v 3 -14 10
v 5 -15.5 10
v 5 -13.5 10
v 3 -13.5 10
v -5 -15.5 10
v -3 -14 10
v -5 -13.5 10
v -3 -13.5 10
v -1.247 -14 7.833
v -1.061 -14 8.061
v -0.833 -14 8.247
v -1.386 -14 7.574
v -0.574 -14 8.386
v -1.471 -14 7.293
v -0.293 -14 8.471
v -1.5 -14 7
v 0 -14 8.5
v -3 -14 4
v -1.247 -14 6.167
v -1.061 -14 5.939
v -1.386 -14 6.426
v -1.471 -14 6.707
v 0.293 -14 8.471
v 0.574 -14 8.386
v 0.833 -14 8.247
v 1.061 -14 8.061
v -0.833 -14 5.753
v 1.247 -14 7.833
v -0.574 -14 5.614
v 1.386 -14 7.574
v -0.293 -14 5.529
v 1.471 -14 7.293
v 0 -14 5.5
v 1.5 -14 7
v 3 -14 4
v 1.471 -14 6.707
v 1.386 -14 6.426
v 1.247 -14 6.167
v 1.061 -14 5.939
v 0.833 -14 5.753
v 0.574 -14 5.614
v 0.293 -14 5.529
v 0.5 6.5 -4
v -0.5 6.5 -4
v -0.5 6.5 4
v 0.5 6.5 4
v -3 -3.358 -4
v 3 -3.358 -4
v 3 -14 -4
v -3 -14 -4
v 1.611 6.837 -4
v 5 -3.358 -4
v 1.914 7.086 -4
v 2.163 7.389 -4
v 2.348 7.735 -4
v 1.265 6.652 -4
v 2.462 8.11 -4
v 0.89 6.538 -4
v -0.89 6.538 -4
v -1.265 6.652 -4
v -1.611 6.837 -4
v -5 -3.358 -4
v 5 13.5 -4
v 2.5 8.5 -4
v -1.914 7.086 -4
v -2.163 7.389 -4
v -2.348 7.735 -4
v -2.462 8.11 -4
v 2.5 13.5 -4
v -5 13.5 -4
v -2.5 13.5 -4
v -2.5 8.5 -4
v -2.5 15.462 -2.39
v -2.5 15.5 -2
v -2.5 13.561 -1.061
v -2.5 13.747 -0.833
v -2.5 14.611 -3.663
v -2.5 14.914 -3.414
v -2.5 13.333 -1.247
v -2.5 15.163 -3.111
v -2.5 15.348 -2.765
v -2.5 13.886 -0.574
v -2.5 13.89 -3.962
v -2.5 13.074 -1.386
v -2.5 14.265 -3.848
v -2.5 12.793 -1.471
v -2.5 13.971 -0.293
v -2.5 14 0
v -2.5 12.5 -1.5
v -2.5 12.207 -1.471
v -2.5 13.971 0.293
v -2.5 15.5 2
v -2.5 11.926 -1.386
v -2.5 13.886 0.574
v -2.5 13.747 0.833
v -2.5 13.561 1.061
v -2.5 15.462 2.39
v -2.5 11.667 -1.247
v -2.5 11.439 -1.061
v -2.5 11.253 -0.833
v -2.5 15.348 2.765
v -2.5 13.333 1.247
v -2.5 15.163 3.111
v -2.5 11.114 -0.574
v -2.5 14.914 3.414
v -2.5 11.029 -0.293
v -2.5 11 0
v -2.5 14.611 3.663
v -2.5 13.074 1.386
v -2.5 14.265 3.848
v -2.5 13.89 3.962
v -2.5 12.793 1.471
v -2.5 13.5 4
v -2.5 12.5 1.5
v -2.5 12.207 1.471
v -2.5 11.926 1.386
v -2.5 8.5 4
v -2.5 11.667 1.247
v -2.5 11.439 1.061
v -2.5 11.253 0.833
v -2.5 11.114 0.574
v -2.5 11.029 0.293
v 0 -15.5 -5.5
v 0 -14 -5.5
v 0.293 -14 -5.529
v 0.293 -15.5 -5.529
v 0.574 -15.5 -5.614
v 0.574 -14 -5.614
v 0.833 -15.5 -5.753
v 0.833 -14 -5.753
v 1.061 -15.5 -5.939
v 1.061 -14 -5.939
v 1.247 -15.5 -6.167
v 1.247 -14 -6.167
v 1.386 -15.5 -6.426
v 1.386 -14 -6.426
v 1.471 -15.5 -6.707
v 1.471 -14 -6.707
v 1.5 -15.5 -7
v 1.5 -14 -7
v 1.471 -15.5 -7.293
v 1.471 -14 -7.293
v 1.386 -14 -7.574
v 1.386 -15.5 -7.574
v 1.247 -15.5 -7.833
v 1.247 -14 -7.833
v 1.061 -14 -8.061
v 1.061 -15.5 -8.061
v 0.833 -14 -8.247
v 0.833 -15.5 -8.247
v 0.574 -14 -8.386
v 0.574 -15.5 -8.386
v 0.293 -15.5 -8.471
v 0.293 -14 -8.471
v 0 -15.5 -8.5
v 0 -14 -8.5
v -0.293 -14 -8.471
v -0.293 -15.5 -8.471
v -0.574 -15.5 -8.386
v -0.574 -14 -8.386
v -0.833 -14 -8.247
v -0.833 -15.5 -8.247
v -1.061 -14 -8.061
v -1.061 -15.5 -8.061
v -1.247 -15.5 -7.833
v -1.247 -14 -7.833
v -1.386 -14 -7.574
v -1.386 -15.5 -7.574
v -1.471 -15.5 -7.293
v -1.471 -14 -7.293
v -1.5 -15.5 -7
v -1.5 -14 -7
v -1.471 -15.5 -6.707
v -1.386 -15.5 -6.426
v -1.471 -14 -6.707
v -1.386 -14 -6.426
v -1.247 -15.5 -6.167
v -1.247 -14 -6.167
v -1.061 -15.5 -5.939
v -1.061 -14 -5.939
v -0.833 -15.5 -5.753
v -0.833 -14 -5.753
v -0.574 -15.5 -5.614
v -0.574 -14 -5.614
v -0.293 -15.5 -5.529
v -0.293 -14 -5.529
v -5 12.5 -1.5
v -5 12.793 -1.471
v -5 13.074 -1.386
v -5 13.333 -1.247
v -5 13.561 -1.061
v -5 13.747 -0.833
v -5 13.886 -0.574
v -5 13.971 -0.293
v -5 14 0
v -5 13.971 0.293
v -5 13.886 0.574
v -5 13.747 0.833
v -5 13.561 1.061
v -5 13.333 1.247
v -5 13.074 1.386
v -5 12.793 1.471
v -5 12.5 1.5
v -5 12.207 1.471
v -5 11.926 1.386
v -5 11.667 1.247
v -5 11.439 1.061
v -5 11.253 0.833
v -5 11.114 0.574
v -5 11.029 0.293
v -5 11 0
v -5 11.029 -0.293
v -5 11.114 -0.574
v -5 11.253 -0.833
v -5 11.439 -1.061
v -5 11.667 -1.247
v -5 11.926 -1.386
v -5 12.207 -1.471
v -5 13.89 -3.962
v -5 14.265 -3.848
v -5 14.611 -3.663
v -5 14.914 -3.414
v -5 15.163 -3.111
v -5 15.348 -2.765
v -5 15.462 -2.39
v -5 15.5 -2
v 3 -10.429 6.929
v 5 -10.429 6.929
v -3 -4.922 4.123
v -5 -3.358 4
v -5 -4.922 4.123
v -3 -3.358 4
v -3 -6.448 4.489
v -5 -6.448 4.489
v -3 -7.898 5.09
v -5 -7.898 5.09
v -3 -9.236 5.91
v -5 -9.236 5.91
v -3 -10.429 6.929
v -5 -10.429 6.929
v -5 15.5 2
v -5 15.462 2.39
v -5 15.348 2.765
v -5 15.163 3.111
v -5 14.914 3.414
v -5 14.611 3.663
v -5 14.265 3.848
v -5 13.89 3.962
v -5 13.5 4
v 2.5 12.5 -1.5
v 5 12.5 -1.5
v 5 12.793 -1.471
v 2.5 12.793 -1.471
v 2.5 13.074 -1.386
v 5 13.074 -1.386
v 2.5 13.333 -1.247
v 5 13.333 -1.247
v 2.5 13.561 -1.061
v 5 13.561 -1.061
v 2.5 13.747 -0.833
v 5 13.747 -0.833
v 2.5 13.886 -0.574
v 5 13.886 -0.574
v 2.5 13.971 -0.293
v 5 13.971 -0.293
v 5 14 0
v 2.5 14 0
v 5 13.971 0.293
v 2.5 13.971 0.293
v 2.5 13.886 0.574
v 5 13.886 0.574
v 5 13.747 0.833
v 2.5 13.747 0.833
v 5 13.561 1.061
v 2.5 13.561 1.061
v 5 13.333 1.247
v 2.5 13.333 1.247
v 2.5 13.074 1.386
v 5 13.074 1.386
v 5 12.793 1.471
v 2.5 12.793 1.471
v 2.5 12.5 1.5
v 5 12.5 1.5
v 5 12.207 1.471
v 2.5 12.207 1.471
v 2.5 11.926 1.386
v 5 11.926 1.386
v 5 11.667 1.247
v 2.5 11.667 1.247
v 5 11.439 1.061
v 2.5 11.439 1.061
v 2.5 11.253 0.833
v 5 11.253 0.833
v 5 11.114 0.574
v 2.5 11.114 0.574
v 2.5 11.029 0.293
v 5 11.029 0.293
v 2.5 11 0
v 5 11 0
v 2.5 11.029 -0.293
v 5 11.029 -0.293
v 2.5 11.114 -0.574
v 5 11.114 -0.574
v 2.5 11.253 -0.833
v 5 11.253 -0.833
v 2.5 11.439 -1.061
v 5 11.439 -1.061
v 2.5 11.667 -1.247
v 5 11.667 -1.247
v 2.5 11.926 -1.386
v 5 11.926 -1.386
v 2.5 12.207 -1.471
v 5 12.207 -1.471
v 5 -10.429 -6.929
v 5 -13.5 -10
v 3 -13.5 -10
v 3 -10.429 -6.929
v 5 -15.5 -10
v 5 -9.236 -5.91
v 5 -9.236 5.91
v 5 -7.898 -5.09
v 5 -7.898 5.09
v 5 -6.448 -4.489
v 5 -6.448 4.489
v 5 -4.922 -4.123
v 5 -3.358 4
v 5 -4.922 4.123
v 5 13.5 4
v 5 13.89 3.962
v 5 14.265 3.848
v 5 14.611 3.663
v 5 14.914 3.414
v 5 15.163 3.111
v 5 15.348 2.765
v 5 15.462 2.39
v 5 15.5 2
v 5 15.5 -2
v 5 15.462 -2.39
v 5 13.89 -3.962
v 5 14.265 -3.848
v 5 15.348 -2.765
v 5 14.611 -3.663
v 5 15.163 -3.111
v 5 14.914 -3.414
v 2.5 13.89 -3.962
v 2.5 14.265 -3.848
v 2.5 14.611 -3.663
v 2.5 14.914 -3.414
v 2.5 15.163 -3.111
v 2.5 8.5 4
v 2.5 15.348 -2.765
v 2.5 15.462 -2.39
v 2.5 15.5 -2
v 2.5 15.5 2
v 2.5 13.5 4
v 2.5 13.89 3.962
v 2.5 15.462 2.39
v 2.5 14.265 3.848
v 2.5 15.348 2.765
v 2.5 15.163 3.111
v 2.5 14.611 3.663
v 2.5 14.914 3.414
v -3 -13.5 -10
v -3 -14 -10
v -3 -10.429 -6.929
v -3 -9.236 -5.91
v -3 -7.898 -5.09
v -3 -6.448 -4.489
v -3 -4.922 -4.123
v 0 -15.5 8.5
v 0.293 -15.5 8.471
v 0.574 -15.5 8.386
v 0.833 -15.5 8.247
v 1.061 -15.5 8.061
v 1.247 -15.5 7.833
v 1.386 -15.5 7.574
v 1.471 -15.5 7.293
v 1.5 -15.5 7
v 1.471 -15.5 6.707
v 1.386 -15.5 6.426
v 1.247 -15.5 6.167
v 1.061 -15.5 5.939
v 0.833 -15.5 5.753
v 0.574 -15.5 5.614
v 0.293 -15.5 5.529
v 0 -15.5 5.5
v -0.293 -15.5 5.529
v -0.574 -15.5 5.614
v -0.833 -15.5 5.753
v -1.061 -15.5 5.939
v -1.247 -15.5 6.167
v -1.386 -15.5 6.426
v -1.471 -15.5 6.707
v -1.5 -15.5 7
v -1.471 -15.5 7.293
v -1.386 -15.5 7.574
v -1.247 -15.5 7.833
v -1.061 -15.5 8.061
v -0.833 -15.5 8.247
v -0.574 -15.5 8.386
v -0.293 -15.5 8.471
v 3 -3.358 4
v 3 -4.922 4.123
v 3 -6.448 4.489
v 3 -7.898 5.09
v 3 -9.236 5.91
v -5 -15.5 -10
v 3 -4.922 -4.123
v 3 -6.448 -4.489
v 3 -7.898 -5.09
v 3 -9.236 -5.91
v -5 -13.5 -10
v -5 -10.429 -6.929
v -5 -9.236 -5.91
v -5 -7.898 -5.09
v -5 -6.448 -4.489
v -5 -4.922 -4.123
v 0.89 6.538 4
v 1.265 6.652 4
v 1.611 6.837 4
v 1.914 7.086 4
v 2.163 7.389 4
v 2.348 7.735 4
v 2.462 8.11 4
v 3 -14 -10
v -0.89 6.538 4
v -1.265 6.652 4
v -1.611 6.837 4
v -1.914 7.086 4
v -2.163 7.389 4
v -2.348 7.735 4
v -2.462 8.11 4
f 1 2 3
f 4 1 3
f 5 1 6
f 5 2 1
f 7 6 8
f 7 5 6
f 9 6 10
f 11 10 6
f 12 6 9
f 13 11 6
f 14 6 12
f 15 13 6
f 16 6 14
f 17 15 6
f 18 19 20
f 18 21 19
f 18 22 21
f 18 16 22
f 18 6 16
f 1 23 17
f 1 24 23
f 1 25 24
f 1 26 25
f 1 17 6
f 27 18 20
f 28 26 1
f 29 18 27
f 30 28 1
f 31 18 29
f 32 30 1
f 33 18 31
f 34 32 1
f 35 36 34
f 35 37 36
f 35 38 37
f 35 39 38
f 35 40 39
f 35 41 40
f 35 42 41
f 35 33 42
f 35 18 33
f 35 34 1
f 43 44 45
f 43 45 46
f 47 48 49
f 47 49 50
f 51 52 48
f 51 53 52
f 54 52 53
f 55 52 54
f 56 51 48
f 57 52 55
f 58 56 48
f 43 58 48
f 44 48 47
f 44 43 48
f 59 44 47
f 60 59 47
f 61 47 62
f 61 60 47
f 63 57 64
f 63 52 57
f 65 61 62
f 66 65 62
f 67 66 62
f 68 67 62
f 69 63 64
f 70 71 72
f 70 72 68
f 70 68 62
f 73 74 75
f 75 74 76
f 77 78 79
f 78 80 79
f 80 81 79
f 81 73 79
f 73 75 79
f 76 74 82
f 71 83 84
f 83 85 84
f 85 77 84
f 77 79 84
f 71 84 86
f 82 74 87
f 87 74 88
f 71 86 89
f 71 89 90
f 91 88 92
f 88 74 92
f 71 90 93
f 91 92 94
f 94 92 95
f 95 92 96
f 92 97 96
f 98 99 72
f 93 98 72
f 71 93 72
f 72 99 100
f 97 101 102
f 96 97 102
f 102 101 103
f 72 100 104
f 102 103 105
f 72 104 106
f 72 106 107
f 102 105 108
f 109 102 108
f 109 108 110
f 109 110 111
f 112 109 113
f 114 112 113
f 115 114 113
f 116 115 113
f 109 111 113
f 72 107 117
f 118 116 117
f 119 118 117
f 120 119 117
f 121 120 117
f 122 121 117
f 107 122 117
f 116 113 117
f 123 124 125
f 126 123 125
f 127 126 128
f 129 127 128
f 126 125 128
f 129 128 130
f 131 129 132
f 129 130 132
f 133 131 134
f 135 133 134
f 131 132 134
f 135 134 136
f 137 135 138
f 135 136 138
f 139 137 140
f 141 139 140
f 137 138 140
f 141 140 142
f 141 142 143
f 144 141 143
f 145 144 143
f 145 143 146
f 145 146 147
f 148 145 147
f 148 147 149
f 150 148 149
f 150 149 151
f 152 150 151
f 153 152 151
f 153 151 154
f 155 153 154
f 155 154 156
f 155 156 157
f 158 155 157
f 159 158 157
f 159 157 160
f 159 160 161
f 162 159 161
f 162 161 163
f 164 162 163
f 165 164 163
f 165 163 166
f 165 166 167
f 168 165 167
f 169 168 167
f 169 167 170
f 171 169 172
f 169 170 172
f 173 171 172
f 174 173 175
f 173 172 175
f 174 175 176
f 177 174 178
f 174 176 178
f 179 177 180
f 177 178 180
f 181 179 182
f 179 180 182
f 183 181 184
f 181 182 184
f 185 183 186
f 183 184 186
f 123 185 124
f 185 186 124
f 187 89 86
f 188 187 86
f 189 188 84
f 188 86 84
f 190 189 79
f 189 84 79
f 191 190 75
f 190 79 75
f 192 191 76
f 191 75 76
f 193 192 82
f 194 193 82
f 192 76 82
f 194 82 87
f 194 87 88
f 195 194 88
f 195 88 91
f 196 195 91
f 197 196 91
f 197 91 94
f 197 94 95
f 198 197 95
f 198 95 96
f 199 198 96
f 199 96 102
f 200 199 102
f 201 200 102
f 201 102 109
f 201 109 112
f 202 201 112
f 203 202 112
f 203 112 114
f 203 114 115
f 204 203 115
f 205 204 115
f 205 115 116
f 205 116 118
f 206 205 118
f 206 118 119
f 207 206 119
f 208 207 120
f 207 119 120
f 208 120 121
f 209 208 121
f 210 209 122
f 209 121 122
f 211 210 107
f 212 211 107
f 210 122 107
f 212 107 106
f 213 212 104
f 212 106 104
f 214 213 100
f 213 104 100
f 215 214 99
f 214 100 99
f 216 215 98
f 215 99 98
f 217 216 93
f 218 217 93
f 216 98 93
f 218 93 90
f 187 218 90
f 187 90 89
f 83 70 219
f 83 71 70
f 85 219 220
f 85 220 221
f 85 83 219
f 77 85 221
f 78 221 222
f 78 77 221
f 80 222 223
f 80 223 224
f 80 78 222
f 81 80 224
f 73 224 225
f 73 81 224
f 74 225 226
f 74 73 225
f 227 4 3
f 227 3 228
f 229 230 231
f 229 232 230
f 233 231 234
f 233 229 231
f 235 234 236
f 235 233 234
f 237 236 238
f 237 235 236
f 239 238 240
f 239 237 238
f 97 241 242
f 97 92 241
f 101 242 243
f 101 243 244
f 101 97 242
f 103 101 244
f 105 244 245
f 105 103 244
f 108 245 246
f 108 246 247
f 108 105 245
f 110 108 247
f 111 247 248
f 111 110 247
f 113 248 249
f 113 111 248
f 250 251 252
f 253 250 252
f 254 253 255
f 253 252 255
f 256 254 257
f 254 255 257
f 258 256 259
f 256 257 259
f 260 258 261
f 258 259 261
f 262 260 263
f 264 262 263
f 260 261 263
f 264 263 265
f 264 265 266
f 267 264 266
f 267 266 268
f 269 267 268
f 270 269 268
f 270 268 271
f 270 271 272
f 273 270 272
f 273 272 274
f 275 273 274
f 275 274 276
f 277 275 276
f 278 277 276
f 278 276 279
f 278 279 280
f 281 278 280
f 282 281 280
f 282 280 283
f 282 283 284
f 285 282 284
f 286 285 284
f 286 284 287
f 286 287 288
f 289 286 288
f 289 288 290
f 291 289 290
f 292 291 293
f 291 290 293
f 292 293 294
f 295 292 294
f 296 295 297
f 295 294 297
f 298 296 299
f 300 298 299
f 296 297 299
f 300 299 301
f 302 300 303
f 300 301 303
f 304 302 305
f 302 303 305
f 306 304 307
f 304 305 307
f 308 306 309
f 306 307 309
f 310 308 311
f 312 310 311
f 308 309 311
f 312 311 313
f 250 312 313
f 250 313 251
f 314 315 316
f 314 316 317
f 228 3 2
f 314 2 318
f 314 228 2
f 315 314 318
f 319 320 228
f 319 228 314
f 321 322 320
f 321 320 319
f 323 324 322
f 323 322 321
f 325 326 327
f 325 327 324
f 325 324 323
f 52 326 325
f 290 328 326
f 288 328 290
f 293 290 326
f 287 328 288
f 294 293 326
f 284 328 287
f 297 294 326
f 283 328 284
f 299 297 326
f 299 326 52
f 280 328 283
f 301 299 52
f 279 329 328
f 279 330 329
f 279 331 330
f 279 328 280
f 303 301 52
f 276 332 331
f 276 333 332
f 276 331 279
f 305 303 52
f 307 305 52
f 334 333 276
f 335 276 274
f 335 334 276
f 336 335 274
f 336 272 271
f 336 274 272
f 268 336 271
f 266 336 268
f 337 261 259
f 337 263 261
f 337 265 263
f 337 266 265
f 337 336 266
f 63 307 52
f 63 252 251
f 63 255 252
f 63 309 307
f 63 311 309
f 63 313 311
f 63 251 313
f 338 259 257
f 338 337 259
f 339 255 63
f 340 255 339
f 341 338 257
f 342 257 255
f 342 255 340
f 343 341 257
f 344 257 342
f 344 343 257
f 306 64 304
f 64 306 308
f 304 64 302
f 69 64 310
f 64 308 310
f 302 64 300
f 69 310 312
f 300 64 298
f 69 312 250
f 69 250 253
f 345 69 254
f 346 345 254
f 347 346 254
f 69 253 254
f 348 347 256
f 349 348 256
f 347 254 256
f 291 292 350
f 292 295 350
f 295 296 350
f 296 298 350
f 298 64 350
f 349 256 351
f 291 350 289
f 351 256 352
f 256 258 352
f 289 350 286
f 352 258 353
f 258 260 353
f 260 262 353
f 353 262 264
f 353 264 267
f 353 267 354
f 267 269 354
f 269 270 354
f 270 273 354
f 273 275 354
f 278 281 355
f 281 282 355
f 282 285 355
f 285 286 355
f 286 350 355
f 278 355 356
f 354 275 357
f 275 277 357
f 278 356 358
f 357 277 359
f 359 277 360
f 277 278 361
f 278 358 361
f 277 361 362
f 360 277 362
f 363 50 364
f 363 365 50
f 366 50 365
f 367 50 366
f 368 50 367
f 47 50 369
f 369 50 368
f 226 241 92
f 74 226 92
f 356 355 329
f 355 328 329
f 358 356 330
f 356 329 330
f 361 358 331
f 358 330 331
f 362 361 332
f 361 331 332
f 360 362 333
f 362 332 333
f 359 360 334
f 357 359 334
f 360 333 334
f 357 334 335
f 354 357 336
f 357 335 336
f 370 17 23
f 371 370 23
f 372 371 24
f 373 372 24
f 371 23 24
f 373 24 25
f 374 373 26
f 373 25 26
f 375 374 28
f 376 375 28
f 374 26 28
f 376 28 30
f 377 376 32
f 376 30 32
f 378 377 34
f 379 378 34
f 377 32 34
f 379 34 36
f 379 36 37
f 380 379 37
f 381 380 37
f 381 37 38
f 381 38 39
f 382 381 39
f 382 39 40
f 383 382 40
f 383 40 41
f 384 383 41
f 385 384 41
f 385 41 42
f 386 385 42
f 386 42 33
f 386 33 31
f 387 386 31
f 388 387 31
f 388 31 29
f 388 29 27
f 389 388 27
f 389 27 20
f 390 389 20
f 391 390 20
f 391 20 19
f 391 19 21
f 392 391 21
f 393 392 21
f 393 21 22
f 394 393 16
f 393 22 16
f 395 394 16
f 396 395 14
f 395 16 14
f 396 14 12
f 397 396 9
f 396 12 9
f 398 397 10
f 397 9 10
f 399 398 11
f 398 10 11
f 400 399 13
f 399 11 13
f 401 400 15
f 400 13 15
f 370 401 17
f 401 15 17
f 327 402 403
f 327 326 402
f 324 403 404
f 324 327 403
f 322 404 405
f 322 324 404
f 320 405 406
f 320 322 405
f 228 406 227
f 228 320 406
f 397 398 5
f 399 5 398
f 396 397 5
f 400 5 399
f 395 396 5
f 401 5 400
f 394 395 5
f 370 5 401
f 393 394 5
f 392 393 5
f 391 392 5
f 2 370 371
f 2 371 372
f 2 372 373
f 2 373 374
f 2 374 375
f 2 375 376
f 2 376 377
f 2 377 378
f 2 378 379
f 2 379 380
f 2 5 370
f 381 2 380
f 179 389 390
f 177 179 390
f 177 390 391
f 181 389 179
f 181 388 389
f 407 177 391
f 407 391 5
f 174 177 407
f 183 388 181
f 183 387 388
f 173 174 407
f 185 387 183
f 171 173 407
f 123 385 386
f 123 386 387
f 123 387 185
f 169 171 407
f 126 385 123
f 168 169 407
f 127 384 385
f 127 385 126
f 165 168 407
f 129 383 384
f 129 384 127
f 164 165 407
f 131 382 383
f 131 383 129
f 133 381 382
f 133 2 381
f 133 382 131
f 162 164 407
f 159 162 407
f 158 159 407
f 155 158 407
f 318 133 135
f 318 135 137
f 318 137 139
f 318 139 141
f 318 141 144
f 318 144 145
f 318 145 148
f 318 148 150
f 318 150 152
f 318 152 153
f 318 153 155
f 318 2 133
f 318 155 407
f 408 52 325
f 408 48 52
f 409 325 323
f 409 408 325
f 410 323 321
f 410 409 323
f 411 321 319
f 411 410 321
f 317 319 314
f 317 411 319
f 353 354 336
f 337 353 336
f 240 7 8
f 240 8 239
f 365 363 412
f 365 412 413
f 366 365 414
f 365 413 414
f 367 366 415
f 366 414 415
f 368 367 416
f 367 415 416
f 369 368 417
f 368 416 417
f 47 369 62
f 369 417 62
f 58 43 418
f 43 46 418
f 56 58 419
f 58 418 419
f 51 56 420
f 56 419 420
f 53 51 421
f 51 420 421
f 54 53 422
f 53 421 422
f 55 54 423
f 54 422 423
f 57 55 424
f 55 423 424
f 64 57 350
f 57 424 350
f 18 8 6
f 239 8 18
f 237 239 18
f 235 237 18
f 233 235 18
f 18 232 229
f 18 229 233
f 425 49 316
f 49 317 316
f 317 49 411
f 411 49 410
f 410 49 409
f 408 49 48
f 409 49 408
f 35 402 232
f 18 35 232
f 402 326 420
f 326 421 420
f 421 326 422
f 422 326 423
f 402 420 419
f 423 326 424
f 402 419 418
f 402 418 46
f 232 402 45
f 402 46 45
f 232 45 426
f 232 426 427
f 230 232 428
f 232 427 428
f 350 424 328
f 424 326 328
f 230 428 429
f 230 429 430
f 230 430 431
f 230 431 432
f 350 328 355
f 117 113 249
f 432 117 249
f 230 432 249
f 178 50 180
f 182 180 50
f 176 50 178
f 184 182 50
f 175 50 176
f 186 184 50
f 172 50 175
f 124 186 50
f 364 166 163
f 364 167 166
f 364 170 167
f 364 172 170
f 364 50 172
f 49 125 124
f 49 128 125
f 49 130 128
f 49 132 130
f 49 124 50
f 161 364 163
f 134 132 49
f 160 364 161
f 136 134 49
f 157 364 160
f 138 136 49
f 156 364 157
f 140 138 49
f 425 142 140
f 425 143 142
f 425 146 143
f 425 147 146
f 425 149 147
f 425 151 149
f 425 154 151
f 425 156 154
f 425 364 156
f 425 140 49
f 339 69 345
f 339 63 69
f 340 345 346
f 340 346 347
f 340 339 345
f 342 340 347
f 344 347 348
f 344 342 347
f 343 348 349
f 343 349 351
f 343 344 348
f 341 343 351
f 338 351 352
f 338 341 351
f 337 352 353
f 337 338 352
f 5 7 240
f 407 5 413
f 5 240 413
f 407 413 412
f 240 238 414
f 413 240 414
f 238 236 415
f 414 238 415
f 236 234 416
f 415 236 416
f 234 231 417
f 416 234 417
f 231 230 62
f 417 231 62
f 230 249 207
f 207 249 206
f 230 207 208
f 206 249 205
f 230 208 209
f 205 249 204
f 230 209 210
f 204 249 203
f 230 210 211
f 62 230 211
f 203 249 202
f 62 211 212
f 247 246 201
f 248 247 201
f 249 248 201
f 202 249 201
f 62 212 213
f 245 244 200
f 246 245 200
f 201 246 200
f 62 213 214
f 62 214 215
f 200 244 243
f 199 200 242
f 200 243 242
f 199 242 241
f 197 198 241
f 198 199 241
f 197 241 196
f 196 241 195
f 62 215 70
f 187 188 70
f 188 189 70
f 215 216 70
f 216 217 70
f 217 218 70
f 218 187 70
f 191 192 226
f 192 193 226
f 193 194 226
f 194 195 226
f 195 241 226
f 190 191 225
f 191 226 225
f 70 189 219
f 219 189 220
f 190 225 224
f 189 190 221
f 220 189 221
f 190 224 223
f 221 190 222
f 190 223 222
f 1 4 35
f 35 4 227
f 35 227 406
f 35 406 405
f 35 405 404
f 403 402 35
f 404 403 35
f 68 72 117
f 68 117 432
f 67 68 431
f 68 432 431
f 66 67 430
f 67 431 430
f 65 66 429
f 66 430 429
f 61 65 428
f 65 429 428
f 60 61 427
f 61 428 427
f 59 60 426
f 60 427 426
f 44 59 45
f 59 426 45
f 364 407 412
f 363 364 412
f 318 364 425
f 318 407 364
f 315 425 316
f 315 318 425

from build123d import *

# Parameters (mm, degrees)
BOSS_EXTRUDE1_DEPTH = 4
SKETCH2_R           = 1.5
CUT_EXTRUDE1_DEPTH  = 19.874586088
BOSS_EXTRUDE2_DEPTH = 5
SKETCH4_W           = 6
SKETCH4_H           = 6
CUT_EXTRUDE2_DEPTH  = 14
SKETCH6_R           = 1.5
CUT_EXTRUDE3_DEPTH  = 20.111514854
FILLET1_R           = 10
FILLET2_R           = 2
FILLET3_R           = 2


with BuildPart() as part:
    # Sketch1 → Boss-Extrude1 (new, symmetric)
    with BuildSketch(Plane.XY):
        Polygon((2.5, 15.5), (5, 15.5), (5, -15.5), (-5, -15.5), (-5, 15.5), (-2.5, 15.5), (-2.5, 6.5), (2.5, 6.5), align=None)
    extrude(amount=BOSS_EXTRUDE1_DEPTH, both=True)

    # Sketch2 → Cut-Extrude1 (cut, through all)
    with BuildSketch(Plane(origin=(5, 0, 0), x_dir=(0, 0, -1), z_dir=(1, 0, 0))):
        with Locations((0, 12.5)):
            Circle(SKETCH2_R)
    extrude(amount=-CUT_EXTRUDE1_DEPTH, mode=Mode.SUBTRACT)

    # Sketch3 → Boss-Extrude2 (add, symmetric)
    with BuildSketch(Plane(origin=(0, 0, 0), x_dir=(0, 0, -1), z_dir=(1, 0, 0))):
        Polygon((-4, -15.5), (-10, -15.5), (-10, -13.5), (-4, -7.5), align=None)
        Polygon((4, -7.5), (4, -15.5), (10, -15.5), (10, -13.5), align=None)
    extrude(amount=BOSS_EXTRUDE2_DEPTH, both=True)

    # Sketch4 → Cut-Extrude2 (cut)
    with BuildSketch(Plane(origin=(0, 0, 0), x_dir=(1, 0, 0), z_dir=(0, 1, 0))):
        with Locations((0, 7)):
            Rectangle(SKETCH4_W, SKETCH4_H)
        with Locations((0, -7)):
            Rectangle(SKETCH4_W, SKETCH4_H)
    extrude(amount=-CUT_EXTRUDE2_DEPTH, mode=Mode.SUBTRACT)

    # Sketch6 → Cut-Extrude3 (cut, through all)
    with BuildSketch(Plane(origin=(0, 0, 0), x_dir=(1, 0, 0), z_dir=(0, 1, 0))):
        with Locations(Location((0, 7, 0), (0, 0, 270))):
            Circle(SKETCH6_R)
        with Locations(Location((0, -7, 0), (0, 0, 270))):
            Circle(SKETCH6_R)
    extrude(amount=-CUT_EXTRUDE3_DEPTH, mode=Mode.SUBTRACT)

    # Fillet1
    fillet1_edges = [part.edges().sort_by_distance(p)[0] for p in [
        (4, -7.5, 4),
        (4, -7.5, -4),
        (-4, -7.5, -4),
        (-4, -7.5, 4),
    ]]
    fillet(fillet1_edges, radius=FILLET1_R)

    # Fillet2
    fillet2_edges = [part.edges().sort_by_distance(p)[0] for p in [
        (-2.5, 6.5, 0),
        (2.5, 6.5, 0),
    ]]
    fillet(fillet2_edges, radius=FILLET2_R)

    # Fillet3
    fillet3_edges = [part.edges().sort_by_distance(p)[0] for p in [
        (3.75, 15.5, -4),
        (-3.75, 15.5, 4),
        (3.75, 15.5, 4),
        (-3.75, 15.5, -4),
    ]]
    fillet(fillet3_edges, radius=FILLET3_R)


solid = part.part
